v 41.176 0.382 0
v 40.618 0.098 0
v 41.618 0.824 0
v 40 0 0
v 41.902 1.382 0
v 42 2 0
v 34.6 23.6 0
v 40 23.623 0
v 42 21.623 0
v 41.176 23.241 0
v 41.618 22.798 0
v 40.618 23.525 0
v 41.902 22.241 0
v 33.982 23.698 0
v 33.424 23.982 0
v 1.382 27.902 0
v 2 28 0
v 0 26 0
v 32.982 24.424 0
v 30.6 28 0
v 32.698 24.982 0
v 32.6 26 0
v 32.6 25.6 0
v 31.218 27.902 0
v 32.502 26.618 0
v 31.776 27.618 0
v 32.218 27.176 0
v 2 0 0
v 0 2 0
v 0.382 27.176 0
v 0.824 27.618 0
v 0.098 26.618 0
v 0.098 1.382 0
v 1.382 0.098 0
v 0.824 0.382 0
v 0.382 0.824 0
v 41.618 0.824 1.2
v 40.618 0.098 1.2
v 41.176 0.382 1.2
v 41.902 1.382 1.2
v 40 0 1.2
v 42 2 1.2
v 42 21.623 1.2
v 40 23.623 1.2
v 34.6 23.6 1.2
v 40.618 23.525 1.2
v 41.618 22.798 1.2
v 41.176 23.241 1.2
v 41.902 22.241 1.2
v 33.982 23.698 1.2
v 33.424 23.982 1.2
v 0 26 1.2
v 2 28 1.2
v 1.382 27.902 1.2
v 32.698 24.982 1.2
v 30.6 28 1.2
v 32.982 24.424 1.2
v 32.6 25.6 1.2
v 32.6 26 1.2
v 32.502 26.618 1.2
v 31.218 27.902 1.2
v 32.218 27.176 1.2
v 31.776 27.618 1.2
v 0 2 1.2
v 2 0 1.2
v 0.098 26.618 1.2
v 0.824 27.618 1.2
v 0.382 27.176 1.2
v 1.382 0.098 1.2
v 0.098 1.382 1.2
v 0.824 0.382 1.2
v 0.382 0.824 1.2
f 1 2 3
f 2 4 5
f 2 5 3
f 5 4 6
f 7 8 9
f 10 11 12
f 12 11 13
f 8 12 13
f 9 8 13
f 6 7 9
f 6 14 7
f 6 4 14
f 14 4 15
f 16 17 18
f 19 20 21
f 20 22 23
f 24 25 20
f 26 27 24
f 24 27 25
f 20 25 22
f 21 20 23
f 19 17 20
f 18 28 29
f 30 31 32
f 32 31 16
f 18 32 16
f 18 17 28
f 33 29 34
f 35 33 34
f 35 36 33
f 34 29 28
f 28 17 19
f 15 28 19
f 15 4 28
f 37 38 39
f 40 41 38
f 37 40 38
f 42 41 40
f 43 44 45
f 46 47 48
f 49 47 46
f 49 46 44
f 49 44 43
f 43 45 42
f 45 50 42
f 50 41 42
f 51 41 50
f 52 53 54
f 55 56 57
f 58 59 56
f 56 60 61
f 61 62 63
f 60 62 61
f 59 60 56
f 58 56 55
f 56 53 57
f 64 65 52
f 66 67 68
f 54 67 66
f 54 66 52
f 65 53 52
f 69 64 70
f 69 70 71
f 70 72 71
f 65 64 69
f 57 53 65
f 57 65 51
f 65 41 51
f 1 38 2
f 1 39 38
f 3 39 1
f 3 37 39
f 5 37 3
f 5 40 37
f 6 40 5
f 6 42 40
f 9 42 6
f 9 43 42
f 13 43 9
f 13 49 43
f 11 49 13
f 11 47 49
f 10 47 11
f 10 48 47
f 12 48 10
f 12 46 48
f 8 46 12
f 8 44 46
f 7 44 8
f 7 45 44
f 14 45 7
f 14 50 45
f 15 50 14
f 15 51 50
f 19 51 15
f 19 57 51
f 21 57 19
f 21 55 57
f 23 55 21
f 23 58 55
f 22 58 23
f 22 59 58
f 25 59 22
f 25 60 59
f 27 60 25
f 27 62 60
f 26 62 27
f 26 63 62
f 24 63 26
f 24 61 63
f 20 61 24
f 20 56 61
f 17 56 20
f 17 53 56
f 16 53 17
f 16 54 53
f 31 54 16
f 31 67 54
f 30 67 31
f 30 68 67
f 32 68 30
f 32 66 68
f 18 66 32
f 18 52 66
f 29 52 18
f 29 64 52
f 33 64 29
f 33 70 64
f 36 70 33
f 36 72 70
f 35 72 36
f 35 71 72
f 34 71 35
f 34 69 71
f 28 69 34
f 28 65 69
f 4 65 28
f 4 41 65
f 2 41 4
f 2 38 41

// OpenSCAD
external_max = [42,28];
cutout=[9.4,4.4];
corner_r=2;
PCB_t=1.2;
no_of_sides=5;


wimuv4_2013_pcb();
/*
difference(){
	square(size=external_max);
	square(size=cutout);
}
*/

module wimuv4_2013_pcb(external_max = [42,28],
cutout=[9.4,4.4],
corner_r=2,
PCB_t=1.2,
no_of_sides=5){
	linear_extrude(height=PCB_t){
		translate(v=external_max)rotate(a=180)minkowski(){
			difference(){
				translate(v=[corner_r,corner_r])square(size=external_max-[2*corner_r,2*corner_r]);
				//square(size=cutout+[corner_r,corner_r]);
				hull(){
					circle(r=2*corner_r);
					translate(v=cutout-[corner_r,corner_r]) circle(r=2*corner_r, $fn=no_of_sides*4);
					translate(v=[0,cutout[1]-corner_r]) circle(r=2*corner_r);
					translate(v=[cutout[0]-corner_r,0]) circle(r=2*corner_r);
	
				}
			}
			circle(r=corner_r, $fn=no_of_sides*4);
		}
	}
}
